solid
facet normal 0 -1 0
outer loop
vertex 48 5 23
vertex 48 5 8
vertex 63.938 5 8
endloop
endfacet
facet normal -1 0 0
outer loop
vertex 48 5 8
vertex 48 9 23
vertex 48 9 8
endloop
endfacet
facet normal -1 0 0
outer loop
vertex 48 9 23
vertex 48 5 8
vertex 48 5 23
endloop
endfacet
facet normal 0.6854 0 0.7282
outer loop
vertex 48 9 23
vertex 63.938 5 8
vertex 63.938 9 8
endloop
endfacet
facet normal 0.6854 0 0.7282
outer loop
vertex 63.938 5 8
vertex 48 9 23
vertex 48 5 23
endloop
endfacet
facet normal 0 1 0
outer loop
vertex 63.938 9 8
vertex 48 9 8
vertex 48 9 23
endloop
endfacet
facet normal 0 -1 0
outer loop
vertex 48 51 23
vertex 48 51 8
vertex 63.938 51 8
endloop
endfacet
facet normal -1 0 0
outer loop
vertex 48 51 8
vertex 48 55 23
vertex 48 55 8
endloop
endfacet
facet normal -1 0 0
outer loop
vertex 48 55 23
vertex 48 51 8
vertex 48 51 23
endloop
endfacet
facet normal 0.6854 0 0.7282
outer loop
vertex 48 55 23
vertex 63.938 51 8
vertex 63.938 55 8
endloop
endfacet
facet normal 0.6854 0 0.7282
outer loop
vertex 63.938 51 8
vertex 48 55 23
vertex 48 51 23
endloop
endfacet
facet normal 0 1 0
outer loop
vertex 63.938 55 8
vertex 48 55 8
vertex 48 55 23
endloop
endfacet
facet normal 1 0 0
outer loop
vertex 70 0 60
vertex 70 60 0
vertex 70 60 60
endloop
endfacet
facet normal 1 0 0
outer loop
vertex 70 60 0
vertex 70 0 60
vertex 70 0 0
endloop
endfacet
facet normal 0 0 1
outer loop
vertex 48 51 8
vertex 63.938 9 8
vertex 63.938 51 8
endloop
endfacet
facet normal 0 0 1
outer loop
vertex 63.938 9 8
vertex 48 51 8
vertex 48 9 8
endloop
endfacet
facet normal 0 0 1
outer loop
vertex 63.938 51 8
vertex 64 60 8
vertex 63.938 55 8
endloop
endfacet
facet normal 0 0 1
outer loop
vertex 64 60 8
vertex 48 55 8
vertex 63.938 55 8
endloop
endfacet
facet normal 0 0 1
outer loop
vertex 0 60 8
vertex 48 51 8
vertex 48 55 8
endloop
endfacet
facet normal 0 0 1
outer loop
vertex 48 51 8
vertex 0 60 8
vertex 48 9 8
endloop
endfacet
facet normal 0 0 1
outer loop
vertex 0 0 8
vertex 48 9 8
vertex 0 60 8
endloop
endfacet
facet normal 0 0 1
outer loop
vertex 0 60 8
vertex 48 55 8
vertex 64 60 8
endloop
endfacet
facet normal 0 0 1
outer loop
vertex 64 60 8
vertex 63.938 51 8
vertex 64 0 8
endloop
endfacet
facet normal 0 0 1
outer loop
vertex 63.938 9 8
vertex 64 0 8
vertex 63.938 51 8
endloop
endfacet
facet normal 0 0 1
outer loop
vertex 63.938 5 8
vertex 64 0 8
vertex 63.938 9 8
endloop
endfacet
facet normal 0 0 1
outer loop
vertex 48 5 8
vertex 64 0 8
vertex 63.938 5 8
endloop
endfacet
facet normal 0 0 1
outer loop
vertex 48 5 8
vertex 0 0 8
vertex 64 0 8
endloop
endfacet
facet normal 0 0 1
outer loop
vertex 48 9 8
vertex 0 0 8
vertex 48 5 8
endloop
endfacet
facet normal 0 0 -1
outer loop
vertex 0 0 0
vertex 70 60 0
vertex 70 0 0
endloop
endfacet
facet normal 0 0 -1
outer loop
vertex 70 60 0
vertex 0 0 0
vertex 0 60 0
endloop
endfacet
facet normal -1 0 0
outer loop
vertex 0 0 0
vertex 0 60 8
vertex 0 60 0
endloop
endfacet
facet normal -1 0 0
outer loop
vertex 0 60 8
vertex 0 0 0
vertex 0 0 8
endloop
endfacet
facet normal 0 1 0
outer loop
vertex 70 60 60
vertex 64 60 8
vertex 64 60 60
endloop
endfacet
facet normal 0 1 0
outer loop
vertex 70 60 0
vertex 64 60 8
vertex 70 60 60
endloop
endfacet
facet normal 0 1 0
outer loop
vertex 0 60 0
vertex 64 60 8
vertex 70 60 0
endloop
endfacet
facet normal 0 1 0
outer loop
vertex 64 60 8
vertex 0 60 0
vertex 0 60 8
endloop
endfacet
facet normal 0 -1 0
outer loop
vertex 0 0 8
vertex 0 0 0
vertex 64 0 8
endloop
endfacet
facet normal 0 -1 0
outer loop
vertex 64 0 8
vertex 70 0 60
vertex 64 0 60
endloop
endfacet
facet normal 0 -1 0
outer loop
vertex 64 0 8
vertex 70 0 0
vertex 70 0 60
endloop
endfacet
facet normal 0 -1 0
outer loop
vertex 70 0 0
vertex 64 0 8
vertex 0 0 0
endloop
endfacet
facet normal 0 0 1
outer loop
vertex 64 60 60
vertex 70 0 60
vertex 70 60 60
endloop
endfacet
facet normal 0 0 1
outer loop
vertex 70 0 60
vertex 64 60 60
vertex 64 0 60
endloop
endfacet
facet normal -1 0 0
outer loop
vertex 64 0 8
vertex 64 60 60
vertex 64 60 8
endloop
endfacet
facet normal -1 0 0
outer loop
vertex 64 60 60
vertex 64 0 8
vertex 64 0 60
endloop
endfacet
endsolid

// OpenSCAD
$fn = 32;

// ----------------------------------------------------------------------
// Rib bracket: 2-gusset L bracket
// ----------------------------------------------------------------------

// --- parameters (mm) ---
base_l = 70;              // foot length, X
base_w = 60;              // foot width, Y
base_t = 8;               // foot thickness
plate_t = 6;              // upright plate thickness
plate_h = 60;             // overall height
gus_l = 16;               // gusset leg along the foot
gus_h = 16;               // gusset height
gus_t = 4;                // gusset thickness
gus_edge = 5;             // gusset margin from the foot edge
n_gus = 2;                // gusset count
fit_tol = 0.05;           // tolerance for press fits, mm
free_tol = 0.3;           // tolerance for clearance fits, mm

gus_pitch = (base_w - 2 * gus_edge - gus_t) / (n_gus - 1);  // gusset pitch

union() {
  cube([base_l, base_w, base_t]);
  translate([base_l - plate_t, 0, base_t - 1])
    cube([plate_t, base_w, plate_h - base_t + 1]);
  for (i = [0 : n_gus - 1])
    translate([base_l - plate_t - gus_l, gus_edge + i * gus_pitch, base_t - 1])
      rotate([-90, 0, 0])
        linear_extrude(height = gus_t)
          polygon(points = [[0, 0], [gus_l + 1, 0], [0, -gus_h]]);
}
